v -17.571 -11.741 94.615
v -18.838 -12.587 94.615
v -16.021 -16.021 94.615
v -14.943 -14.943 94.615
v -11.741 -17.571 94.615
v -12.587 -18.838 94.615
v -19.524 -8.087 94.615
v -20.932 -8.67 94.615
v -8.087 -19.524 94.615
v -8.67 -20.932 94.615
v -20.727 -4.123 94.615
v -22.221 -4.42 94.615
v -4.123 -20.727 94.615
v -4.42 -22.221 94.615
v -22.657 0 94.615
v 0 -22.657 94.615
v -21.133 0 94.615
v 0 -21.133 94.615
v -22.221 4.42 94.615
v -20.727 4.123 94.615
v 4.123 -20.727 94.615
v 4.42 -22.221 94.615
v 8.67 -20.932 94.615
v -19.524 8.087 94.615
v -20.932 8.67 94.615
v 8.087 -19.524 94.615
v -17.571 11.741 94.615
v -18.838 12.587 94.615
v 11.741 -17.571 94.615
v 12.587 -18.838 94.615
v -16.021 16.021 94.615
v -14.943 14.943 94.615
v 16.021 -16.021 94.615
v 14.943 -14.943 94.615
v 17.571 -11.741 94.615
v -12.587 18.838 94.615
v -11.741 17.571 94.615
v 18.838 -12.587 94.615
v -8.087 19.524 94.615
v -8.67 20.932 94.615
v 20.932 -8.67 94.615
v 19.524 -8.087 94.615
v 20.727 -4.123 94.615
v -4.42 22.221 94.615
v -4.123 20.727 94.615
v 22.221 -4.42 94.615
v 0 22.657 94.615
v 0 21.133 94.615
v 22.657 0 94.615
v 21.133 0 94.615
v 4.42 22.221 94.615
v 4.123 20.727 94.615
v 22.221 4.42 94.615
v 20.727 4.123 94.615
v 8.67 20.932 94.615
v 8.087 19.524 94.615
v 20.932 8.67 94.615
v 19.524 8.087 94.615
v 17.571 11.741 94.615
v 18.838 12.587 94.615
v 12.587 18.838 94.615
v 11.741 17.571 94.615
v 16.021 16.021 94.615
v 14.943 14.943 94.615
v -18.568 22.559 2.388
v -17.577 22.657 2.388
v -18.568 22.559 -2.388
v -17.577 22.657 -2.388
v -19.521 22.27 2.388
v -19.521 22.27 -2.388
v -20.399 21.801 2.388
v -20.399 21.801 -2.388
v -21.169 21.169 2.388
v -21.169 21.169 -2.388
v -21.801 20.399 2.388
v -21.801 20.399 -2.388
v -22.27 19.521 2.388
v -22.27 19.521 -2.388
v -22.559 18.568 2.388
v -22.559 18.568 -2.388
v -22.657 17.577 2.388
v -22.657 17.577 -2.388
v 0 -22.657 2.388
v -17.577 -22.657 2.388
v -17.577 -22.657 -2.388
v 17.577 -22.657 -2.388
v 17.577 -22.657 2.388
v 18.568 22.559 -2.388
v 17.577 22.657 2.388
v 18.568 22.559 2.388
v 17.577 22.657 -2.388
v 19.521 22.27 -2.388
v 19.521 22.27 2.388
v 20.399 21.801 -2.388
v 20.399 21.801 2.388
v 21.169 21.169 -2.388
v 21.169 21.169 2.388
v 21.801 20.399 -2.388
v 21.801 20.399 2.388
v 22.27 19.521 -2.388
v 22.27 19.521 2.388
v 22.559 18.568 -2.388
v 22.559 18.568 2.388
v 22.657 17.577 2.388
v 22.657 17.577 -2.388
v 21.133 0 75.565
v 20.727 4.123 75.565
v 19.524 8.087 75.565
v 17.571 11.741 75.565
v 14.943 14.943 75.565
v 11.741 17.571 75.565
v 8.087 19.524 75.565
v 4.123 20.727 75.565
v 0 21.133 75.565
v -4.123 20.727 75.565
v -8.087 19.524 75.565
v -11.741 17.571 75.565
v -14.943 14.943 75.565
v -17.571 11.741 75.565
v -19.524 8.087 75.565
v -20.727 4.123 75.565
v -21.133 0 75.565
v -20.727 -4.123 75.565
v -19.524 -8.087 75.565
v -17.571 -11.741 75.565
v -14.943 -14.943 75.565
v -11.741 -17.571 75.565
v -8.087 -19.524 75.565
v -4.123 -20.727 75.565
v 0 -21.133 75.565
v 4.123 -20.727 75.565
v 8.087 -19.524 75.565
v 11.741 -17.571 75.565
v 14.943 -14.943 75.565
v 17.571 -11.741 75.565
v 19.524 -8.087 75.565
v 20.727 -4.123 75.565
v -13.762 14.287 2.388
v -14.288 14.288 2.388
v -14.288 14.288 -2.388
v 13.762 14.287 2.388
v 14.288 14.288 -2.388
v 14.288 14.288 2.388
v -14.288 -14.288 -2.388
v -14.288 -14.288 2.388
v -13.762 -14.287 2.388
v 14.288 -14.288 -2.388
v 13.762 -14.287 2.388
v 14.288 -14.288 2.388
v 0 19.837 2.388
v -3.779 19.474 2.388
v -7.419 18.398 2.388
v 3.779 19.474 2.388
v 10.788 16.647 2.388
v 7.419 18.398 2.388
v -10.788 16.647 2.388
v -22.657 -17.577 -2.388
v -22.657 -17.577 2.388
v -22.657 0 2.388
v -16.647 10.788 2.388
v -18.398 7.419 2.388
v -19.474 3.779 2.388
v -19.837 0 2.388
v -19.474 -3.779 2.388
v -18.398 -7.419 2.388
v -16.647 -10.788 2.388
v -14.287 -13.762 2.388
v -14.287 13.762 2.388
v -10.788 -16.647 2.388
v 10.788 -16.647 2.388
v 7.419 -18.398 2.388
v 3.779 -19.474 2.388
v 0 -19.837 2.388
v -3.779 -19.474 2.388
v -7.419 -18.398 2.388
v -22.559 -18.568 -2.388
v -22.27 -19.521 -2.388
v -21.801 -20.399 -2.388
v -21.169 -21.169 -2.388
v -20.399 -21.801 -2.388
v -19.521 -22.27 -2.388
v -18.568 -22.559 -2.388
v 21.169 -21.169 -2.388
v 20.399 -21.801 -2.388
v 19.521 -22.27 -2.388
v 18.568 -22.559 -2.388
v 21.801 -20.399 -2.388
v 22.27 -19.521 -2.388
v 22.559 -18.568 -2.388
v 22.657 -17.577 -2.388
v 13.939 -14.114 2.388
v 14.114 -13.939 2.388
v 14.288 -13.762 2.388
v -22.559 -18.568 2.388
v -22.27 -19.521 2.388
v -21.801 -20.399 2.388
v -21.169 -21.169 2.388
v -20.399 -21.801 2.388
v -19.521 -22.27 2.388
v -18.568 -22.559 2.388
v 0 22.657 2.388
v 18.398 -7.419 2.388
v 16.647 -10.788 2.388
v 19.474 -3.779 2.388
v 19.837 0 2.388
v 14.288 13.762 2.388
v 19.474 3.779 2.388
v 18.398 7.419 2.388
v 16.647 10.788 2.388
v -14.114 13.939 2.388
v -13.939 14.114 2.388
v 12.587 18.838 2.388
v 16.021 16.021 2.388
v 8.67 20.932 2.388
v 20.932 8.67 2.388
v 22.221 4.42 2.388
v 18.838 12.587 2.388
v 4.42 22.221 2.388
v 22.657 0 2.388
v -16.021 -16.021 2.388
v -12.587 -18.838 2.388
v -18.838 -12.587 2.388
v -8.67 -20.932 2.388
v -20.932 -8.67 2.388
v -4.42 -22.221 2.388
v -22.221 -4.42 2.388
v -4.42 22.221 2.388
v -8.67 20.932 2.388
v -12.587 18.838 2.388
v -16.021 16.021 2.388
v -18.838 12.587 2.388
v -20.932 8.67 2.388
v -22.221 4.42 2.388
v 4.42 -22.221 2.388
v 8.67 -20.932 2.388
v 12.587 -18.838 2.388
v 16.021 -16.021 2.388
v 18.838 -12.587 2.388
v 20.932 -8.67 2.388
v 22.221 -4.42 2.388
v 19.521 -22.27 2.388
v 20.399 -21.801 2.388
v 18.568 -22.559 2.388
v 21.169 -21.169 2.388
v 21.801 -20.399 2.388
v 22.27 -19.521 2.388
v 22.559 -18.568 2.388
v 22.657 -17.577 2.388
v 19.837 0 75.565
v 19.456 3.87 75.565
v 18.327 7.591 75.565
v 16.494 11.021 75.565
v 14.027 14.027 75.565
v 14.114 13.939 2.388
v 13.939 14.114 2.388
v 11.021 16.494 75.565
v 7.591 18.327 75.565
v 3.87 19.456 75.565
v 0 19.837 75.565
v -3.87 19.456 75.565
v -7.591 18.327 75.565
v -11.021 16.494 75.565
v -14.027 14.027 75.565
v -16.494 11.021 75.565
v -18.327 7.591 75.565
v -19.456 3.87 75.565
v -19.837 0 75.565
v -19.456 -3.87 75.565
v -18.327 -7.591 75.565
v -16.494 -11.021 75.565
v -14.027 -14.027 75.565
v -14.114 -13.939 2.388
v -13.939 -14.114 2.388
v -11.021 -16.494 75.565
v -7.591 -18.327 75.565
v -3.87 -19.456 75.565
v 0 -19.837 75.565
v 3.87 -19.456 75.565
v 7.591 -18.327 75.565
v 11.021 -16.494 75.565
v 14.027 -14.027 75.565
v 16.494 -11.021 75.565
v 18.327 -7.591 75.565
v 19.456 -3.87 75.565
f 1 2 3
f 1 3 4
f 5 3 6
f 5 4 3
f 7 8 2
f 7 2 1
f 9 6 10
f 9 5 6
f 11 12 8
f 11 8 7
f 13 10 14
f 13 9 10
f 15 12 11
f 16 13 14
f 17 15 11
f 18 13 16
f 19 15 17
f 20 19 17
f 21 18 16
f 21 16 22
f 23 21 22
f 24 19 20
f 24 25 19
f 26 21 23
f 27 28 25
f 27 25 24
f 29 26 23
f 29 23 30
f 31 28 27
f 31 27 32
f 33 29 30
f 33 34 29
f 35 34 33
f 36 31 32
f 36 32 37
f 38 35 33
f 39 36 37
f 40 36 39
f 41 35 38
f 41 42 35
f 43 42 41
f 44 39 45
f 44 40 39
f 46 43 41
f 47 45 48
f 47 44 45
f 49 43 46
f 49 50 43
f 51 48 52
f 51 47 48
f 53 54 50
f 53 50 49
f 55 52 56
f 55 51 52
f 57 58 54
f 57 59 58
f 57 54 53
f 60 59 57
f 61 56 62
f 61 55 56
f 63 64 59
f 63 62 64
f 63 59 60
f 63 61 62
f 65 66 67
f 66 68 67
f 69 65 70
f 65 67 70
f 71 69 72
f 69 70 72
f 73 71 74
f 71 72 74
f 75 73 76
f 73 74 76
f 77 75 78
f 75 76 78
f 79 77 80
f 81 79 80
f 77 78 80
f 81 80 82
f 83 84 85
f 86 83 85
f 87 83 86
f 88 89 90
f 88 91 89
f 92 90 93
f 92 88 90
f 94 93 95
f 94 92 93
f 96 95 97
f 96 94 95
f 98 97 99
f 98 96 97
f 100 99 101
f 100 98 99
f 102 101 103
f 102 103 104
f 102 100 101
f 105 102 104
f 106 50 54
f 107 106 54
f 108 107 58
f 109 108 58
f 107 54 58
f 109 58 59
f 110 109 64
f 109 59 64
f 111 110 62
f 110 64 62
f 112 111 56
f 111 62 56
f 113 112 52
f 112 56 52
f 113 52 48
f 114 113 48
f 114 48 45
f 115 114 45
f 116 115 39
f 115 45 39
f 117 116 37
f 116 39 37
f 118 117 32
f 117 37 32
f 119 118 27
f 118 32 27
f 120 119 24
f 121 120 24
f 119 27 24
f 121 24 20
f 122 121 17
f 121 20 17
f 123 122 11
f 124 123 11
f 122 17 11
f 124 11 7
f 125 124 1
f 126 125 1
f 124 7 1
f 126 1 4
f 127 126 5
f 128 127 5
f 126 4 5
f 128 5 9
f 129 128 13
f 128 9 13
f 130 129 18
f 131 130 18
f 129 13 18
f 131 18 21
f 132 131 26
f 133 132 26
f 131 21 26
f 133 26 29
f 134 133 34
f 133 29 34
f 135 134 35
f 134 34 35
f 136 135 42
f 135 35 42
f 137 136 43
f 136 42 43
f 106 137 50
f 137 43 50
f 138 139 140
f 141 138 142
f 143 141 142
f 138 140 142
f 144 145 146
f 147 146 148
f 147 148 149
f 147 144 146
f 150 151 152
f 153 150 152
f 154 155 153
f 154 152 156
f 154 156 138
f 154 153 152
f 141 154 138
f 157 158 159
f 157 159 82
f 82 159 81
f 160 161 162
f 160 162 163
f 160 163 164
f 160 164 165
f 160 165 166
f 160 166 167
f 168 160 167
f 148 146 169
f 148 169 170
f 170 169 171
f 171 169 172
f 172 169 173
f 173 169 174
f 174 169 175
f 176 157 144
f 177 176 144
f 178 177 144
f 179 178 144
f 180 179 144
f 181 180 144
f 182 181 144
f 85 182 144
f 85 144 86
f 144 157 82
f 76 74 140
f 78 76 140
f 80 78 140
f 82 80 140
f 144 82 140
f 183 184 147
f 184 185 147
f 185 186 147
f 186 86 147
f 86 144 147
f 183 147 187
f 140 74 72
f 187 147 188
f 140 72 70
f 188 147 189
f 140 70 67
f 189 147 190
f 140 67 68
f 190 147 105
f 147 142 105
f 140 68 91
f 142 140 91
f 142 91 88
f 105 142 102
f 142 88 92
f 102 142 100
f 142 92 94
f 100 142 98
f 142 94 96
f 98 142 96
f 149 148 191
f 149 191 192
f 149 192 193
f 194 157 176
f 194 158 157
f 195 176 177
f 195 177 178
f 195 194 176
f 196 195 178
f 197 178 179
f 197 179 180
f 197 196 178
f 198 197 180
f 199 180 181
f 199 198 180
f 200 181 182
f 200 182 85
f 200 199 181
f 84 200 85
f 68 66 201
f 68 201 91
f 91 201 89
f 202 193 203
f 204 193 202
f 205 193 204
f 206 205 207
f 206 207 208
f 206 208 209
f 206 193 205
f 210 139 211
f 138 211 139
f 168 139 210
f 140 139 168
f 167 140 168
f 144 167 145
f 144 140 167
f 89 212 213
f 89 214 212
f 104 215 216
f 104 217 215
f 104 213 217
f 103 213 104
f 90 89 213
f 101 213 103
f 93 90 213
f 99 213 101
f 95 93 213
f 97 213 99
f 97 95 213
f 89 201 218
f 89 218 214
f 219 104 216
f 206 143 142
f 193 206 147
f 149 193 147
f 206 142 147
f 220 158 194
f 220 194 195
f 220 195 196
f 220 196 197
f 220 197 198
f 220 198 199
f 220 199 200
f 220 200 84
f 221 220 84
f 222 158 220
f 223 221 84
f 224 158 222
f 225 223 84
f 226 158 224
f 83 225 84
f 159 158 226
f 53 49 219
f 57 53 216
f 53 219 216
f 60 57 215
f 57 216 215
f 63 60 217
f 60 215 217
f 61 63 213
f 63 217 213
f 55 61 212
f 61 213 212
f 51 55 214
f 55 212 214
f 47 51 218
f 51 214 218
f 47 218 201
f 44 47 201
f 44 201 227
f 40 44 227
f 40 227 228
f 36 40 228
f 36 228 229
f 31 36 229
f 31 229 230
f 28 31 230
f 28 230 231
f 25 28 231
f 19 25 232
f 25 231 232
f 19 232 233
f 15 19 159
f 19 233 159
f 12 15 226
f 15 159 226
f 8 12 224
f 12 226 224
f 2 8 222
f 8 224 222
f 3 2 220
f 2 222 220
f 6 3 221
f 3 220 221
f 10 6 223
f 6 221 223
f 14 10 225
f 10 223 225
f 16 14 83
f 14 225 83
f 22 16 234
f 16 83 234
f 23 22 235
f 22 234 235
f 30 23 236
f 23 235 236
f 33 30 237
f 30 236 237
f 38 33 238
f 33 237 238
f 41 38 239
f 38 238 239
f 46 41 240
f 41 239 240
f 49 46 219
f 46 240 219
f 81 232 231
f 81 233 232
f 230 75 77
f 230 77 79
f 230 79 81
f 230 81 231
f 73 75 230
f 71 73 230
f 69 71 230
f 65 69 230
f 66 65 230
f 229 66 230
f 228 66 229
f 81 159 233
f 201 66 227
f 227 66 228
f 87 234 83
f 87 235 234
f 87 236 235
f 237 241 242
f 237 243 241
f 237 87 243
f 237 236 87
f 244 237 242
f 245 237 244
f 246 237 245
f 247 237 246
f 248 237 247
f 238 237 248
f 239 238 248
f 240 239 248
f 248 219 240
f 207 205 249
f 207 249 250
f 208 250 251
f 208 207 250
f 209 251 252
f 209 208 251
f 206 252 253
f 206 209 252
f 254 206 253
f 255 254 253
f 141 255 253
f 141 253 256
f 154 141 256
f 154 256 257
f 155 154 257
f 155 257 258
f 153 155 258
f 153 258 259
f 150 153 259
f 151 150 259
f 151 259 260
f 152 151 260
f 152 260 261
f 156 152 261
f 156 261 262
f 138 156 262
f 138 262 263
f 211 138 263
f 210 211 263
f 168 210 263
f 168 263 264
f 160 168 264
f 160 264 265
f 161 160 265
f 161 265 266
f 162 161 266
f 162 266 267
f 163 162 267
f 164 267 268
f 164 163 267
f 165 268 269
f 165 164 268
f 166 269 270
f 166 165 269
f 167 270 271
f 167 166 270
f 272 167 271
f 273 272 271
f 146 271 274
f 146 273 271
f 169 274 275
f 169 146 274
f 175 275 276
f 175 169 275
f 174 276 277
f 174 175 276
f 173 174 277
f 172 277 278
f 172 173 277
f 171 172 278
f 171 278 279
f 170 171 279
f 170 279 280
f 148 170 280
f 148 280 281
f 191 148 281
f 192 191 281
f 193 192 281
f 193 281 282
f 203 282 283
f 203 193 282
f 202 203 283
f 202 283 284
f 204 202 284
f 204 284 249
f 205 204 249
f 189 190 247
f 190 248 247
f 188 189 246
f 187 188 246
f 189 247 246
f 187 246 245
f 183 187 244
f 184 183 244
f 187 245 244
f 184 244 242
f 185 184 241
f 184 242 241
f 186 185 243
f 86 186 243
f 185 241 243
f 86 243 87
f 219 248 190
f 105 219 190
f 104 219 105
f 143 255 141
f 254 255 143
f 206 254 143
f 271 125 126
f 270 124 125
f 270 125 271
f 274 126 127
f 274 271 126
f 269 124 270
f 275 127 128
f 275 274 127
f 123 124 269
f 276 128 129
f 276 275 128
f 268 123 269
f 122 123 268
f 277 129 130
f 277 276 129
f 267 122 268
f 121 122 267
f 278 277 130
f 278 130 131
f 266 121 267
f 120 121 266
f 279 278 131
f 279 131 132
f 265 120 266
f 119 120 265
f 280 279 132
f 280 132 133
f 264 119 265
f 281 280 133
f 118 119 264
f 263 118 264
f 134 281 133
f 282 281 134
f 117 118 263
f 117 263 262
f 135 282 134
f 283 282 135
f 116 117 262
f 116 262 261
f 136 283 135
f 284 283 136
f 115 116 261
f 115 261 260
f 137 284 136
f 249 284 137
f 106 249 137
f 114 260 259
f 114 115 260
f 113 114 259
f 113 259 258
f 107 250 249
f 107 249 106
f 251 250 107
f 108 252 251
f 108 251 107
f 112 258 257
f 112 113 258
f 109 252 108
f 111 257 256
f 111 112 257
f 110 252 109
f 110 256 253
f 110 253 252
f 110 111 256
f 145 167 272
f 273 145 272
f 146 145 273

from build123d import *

# Parameters (mm, degrees)
F0_W     = 45.3136
F0_H     = 45.3136
F1_DEPTH = 2.3876
F2_R     = 22.6568
F2_R_2   = 19.8374
F3_DEPTH = 92.2274
F4_W     = 28.575
F4_H     = 28.575
F5_DEPTH = 4.7752
F6_R     = 21.1328
F7_DEPTH = 19.05
F8_R     = 5.08


with BuildPart() as f1:
    # F0 (on Top) → F1 (new body, symmetric)
    with BuildSketch(Plane.XY):
        Rectangle(F0_W, F0_H)
    extrude(amount=F1_DEPTH, both=True)

    # F2 (on face) → F3 (join)
    with BuildSketch(Plane.XY.offset(2.3876)):
        Circle(F2_R)
        Circle(F2_R_2, mode=Mode.SUBTRACT)
    extrude(amount=F3_DEPTH)

    # F4 (on face) → F5 (cut, through all)
    with BuildSketch(Plane(origin=(0, 0, -2.3876), x_dir=(1, 0, 0), z_dir=(0, 0, -1))):
        Rectangle(F4_W, F4_H)
    extrude(amount=-F5_DEPTH, mode=Mode.SUBTRACT)

    # F6 (on face) → F7 (cut)
    with BuildSketch(Plane.XY.offset(94.615)):
        Circle(F6_R)
    extrude(amount=-F7_DEPTH, mode=Mode.SUBTRACT)

    # F8
    f8_edges = [f1.edges().sort_by_distance(p)[0] for p in [
        (-22.6568, -22.6568, 0),
        (-22.6568, 22.6568, 0),
        (22.6568, -22.6568, 0),
        (22.6568, 22.6568, 0),
    ]]
    fillet(f8_edges, radius=F8_R)


solid = f1.part
